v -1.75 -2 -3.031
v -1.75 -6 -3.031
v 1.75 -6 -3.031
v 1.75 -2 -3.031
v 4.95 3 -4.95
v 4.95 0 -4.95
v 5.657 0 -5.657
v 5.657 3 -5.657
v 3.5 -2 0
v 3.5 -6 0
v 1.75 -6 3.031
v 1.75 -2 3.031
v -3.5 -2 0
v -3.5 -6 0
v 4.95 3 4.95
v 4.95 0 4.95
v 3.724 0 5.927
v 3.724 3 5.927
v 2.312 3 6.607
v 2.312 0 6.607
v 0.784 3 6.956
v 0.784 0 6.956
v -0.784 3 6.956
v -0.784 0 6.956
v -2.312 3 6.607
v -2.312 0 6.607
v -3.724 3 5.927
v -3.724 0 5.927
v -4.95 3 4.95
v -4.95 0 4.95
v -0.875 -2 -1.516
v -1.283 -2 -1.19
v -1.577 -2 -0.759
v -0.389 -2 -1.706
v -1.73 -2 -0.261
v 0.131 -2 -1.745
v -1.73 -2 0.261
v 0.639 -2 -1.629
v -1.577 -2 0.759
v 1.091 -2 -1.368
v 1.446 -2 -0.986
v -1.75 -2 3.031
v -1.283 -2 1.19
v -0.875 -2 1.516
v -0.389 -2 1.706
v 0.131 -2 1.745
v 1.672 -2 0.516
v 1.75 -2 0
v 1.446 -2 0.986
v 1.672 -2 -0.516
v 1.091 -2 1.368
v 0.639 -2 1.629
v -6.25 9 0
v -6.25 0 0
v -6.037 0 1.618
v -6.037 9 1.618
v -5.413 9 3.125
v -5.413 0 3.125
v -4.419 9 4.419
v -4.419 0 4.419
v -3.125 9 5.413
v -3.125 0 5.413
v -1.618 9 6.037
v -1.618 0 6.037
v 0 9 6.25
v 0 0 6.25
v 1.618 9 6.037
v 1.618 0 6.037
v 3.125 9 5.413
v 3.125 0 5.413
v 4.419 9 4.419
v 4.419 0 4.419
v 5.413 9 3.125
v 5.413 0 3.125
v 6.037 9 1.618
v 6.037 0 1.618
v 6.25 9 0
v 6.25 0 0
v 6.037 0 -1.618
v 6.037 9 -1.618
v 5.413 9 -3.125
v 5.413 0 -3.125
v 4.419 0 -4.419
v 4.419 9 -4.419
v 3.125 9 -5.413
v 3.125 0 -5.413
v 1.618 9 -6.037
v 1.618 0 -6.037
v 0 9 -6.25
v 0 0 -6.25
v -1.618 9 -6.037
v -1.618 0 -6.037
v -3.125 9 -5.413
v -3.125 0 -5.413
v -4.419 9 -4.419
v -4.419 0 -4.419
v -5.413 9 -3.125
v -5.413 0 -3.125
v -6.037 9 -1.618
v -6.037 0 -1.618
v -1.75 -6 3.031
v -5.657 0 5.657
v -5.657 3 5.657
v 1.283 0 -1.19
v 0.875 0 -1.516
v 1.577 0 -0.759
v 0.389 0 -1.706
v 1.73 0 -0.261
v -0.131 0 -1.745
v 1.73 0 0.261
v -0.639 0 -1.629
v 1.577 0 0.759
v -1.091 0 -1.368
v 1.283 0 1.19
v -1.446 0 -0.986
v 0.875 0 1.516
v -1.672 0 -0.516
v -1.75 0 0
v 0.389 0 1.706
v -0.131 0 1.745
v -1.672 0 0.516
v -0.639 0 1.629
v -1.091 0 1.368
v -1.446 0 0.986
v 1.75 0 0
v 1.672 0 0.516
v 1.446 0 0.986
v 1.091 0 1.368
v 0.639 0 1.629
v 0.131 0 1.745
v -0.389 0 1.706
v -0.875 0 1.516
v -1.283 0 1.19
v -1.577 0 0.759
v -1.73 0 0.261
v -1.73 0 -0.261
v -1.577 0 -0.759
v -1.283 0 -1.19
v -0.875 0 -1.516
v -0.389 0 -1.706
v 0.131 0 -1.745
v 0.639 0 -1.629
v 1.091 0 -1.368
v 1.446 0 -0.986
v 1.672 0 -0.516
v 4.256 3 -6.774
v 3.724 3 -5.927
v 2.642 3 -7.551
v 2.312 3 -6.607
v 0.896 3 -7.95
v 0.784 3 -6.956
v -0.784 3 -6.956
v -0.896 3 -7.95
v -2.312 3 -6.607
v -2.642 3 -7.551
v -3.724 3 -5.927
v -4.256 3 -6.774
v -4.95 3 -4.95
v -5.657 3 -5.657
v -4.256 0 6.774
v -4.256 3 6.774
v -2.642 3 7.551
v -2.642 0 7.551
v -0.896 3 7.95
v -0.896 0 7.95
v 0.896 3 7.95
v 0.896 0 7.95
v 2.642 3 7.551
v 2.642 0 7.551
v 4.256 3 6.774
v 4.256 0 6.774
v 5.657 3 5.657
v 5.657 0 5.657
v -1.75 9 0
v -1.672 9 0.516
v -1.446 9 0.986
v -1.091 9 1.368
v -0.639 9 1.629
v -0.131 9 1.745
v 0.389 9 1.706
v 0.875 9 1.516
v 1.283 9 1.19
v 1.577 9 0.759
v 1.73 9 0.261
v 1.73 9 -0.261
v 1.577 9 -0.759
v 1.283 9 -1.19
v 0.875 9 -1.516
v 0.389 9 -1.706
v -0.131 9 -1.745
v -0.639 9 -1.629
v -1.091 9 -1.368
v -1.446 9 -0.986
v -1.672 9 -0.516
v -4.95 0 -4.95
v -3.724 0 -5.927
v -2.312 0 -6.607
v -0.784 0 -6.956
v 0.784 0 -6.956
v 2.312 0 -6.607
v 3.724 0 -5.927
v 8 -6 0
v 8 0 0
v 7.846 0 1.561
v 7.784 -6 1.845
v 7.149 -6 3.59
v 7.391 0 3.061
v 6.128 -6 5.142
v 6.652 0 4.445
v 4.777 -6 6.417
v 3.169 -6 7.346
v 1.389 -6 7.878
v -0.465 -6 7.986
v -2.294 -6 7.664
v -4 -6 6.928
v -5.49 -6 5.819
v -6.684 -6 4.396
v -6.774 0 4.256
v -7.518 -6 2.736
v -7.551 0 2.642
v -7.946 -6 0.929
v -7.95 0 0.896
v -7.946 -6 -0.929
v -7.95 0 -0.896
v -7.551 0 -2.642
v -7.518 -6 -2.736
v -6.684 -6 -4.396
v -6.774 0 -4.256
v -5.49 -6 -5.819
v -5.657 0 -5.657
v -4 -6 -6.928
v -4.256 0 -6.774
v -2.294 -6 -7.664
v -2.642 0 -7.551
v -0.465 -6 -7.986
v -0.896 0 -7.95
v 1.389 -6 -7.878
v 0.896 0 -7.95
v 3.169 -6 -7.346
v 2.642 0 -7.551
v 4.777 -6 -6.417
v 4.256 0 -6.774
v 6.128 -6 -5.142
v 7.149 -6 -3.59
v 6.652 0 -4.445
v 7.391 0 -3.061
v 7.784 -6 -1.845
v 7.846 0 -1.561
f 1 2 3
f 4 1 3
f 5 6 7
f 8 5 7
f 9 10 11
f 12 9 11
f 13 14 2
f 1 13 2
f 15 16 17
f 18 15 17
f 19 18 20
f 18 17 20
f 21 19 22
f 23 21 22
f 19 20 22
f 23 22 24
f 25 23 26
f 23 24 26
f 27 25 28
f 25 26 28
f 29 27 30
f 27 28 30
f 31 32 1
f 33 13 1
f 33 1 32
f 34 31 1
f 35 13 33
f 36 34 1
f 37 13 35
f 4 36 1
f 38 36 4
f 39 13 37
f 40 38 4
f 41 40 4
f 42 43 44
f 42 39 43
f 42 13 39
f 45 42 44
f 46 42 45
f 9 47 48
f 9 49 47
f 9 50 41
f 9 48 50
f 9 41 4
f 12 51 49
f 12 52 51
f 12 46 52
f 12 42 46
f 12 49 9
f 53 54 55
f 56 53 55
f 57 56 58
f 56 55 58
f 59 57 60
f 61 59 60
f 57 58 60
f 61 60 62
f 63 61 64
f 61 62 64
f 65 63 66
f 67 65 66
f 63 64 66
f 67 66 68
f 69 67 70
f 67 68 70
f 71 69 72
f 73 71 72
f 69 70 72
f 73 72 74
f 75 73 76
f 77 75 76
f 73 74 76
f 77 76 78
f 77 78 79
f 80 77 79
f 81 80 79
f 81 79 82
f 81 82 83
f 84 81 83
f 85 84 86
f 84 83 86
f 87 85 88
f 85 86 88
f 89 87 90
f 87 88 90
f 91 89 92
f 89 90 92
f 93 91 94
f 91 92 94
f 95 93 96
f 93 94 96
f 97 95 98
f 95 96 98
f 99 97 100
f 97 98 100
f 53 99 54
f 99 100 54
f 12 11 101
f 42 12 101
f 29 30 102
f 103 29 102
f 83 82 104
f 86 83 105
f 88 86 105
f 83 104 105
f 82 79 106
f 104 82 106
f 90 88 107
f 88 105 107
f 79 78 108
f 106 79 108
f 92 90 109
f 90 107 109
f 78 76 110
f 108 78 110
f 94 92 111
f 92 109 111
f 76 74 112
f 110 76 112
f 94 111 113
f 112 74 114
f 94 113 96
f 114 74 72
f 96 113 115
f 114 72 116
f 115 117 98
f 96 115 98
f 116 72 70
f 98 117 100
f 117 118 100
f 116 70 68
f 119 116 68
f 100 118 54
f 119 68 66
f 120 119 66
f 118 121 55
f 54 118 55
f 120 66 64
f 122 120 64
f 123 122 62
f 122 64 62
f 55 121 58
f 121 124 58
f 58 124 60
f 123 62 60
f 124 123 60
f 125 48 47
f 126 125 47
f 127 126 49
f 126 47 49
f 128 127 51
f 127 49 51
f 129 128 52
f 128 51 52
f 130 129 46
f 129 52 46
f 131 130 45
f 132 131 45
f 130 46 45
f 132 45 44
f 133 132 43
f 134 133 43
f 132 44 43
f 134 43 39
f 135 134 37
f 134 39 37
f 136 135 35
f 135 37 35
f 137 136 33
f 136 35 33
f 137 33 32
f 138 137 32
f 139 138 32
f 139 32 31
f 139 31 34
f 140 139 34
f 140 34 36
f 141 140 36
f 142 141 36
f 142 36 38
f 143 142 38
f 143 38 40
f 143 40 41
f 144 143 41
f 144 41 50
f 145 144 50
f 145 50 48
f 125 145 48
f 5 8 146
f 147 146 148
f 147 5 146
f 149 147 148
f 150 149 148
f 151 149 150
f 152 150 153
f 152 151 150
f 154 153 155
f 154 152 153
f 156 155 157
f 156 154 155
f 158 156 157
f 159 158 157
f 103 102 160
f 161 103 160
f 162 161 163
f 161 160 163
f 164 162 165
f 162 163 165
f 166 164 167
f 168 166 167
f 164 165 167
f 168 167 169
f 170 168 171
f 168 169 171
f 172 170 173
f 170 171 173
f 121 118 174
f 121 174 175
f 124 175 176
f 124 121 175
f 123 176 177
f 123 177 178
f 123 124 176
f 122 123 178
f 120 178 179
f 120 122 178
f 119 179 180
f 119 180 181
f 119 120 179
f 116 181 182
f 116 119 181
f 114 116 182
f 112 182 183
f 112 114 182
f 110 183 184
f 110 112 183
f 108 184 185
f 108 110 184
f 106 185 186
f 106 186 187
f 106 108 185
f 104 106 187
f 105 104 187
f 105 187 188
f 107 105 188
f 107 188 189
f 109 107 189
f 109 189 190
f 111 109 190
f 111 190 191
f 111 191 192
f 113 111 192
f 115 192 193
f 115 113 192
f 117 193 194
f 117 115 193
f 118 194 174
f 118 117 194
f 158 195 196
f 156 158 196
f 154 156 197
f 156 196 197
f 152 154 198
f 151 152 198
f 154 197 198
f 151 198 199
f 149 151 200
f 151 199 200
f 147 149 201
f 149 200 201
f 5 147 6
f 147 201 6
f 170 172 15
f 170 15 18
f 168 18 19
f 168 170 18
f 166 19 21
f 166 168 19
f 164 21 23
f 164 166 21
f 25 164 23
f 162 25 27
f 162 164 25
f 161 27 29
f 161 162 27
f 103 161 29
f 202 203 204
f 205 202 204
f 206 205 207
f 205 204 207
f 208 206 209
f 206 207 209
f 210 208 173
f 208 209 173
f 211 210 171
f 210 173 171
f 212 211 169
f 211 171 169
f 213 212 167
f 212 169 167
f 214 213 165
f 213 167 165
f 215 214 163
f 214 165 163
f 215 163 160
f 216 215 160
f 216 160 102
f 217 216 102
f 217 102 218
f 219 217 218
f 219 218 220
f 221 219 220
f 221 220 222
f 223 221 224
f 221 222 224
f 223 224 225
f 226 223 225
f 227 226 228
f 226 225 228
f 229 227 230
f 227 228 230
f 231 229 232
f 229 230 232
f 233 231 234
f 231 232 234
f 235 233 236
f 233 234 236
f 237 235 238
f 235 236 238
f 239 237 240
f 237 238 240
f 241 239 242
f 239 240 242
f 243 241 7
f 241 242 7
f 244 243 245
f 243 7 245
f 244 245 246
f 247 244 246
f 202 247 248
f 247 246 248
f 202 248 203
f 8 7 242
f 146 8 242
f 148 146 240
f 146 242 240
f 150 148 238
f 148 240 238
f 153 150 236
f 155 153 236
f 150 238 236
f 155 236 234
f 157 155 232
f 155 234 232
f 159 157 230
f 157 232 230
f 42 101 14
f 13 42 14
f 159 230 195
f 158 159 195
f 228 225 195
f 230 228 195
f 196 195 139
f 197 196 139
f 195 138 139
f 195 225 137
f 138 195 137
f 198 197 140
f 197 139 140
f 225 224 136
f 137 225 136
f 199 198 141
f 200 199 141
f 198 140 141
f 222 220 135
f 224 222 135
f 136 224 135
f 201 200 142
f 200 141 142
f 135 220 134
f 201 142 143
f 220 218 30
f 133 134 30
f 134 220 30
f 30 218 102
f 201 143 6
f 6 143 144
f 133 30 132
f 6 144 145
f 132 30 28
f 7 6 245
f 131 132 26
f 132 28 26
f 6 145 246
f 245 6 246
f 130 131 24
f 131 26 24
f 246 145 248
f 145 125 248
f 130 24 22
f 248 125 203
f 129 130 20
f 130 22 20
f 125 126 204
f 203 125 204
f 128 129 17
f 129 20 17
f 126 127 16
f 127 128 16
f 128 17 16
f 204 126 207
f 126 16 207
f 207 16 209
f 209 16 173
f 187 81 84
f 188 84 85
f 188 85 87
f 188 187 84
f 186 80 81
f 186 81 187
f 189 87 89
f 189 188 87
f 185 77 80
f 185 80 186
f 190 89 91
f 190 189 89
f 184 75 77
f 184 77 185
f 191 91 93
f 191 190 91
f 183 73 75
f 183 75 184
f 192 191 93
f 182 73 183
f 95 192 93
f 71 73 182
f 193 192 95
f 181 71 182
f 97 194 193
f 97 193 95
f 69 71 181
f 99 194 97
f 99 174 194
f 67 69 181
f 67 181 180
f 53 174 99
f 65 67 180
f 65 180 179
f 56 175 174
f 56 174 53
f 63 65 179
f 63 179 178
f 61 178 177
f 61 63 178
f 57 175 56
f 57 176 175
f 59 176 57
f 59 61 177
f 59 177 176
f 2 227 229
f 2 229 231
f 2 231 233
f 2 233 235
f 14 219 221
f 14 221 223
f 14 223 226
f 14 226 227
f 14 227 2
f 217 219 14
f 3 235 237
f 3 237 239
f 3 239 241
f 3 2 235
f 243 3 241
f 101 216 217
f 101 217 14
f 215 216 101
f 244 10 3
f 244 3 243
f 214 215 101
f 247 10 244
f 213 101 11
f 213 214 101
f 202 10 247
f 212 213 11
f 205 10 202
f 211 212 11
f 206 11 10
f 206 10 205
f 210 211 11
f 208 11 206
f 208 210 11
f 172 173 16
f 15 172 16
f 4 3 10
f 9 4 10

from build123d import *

# Parameters (mm, degrees)
F0_R     = 8
F1_DEPTH = 6
F3_DEPTH = 4
F5_DEPTH = 3
F6_R     = 1.75
F7_DEPTH = 25
F8_R     = 6.25
F8_R_2   = 1.75
F9_DEPTH = 9


with BuildPart() as f1:
    # F0 (on Front) → F1 (new body)
    with BuildSketch(Plane.XZ):
        Circle(F0_R)
    extrude(amount=F1_DEPTH)

    # F2 (on face) → F3 (cut)
    with BuildSketch(Plane.XZ.offset(6)):
        Polygon((-1.75, -3.0310889132), (1.75, -3.0310889132), (3.5, 0), (1.75, 3.0310889132), (-1.75, 3.0310889132), (-3.5, 0), align=None)
    extrude(amount=-F3_DEPTH, mode=Mode.SUBTRACT)

    # F4 (on face) → F5 (join)
    with BuildSketch(Plane(origin=(0, 0, 0), x_dir=(-1, 0, 0), z_dir=(0, 1, 0))):
        with BuildLine():
            Line((-4.9497474683, -4.9497474683), (-5.6568542495, -5.6568542495))
            ThreePointArc((-5.6568542495, -5.6568542495), (0, -8), (5.6568542495, -5.6568542495))
            Line((5.6568542495, -5.6568542495), (4.9497474683, -4.9497474683))
            ThreePointArc((4.9497474683, -4.9497474683), (0, -7), (-4.9497474683, -4.9497474683))
        make_face()
        with BuildLine():
            Line((4.9497474683, 4.9497474683), (5.6568542495, 5.6568542495))
            ThreePointArc((5.6568542495, 5.6568542495), (0, 8), (-5.6568542495, 5.6568542495))
            Line((-5.6568542495, 5.6568542495), (-4.9497474683, 4.9497474683))
            ThreePointArc((-4.9497474683, 4.9497474683), (0, 7), (4.9497474683, 4.9497474683))
        make_face()
    extrude(amount=F5_DEPTH)

    # F6 (on face) → F7 (cut)
    with BuildSketch(Plane.XZ.offset(2)):
        Circle(F6_R)
    extrude(amount=-F7_DEPTH, mode=Mode.SUBTRACT)


with BuildPart() as f9:
    # F8 (on face) → F9 (new body)
    with BuildSketch(Plane(origin=(0, 0, 0), x_dir=(-1, 0, 0), z_dir=(0, 1, 0))):
        Circle(F8_R)
        Circle(F8_R_2, mode=Mode.SUBTRACT)
    extrude(amount=F9_DEPTH)


solid = Compound([f1.part, f9.part])
